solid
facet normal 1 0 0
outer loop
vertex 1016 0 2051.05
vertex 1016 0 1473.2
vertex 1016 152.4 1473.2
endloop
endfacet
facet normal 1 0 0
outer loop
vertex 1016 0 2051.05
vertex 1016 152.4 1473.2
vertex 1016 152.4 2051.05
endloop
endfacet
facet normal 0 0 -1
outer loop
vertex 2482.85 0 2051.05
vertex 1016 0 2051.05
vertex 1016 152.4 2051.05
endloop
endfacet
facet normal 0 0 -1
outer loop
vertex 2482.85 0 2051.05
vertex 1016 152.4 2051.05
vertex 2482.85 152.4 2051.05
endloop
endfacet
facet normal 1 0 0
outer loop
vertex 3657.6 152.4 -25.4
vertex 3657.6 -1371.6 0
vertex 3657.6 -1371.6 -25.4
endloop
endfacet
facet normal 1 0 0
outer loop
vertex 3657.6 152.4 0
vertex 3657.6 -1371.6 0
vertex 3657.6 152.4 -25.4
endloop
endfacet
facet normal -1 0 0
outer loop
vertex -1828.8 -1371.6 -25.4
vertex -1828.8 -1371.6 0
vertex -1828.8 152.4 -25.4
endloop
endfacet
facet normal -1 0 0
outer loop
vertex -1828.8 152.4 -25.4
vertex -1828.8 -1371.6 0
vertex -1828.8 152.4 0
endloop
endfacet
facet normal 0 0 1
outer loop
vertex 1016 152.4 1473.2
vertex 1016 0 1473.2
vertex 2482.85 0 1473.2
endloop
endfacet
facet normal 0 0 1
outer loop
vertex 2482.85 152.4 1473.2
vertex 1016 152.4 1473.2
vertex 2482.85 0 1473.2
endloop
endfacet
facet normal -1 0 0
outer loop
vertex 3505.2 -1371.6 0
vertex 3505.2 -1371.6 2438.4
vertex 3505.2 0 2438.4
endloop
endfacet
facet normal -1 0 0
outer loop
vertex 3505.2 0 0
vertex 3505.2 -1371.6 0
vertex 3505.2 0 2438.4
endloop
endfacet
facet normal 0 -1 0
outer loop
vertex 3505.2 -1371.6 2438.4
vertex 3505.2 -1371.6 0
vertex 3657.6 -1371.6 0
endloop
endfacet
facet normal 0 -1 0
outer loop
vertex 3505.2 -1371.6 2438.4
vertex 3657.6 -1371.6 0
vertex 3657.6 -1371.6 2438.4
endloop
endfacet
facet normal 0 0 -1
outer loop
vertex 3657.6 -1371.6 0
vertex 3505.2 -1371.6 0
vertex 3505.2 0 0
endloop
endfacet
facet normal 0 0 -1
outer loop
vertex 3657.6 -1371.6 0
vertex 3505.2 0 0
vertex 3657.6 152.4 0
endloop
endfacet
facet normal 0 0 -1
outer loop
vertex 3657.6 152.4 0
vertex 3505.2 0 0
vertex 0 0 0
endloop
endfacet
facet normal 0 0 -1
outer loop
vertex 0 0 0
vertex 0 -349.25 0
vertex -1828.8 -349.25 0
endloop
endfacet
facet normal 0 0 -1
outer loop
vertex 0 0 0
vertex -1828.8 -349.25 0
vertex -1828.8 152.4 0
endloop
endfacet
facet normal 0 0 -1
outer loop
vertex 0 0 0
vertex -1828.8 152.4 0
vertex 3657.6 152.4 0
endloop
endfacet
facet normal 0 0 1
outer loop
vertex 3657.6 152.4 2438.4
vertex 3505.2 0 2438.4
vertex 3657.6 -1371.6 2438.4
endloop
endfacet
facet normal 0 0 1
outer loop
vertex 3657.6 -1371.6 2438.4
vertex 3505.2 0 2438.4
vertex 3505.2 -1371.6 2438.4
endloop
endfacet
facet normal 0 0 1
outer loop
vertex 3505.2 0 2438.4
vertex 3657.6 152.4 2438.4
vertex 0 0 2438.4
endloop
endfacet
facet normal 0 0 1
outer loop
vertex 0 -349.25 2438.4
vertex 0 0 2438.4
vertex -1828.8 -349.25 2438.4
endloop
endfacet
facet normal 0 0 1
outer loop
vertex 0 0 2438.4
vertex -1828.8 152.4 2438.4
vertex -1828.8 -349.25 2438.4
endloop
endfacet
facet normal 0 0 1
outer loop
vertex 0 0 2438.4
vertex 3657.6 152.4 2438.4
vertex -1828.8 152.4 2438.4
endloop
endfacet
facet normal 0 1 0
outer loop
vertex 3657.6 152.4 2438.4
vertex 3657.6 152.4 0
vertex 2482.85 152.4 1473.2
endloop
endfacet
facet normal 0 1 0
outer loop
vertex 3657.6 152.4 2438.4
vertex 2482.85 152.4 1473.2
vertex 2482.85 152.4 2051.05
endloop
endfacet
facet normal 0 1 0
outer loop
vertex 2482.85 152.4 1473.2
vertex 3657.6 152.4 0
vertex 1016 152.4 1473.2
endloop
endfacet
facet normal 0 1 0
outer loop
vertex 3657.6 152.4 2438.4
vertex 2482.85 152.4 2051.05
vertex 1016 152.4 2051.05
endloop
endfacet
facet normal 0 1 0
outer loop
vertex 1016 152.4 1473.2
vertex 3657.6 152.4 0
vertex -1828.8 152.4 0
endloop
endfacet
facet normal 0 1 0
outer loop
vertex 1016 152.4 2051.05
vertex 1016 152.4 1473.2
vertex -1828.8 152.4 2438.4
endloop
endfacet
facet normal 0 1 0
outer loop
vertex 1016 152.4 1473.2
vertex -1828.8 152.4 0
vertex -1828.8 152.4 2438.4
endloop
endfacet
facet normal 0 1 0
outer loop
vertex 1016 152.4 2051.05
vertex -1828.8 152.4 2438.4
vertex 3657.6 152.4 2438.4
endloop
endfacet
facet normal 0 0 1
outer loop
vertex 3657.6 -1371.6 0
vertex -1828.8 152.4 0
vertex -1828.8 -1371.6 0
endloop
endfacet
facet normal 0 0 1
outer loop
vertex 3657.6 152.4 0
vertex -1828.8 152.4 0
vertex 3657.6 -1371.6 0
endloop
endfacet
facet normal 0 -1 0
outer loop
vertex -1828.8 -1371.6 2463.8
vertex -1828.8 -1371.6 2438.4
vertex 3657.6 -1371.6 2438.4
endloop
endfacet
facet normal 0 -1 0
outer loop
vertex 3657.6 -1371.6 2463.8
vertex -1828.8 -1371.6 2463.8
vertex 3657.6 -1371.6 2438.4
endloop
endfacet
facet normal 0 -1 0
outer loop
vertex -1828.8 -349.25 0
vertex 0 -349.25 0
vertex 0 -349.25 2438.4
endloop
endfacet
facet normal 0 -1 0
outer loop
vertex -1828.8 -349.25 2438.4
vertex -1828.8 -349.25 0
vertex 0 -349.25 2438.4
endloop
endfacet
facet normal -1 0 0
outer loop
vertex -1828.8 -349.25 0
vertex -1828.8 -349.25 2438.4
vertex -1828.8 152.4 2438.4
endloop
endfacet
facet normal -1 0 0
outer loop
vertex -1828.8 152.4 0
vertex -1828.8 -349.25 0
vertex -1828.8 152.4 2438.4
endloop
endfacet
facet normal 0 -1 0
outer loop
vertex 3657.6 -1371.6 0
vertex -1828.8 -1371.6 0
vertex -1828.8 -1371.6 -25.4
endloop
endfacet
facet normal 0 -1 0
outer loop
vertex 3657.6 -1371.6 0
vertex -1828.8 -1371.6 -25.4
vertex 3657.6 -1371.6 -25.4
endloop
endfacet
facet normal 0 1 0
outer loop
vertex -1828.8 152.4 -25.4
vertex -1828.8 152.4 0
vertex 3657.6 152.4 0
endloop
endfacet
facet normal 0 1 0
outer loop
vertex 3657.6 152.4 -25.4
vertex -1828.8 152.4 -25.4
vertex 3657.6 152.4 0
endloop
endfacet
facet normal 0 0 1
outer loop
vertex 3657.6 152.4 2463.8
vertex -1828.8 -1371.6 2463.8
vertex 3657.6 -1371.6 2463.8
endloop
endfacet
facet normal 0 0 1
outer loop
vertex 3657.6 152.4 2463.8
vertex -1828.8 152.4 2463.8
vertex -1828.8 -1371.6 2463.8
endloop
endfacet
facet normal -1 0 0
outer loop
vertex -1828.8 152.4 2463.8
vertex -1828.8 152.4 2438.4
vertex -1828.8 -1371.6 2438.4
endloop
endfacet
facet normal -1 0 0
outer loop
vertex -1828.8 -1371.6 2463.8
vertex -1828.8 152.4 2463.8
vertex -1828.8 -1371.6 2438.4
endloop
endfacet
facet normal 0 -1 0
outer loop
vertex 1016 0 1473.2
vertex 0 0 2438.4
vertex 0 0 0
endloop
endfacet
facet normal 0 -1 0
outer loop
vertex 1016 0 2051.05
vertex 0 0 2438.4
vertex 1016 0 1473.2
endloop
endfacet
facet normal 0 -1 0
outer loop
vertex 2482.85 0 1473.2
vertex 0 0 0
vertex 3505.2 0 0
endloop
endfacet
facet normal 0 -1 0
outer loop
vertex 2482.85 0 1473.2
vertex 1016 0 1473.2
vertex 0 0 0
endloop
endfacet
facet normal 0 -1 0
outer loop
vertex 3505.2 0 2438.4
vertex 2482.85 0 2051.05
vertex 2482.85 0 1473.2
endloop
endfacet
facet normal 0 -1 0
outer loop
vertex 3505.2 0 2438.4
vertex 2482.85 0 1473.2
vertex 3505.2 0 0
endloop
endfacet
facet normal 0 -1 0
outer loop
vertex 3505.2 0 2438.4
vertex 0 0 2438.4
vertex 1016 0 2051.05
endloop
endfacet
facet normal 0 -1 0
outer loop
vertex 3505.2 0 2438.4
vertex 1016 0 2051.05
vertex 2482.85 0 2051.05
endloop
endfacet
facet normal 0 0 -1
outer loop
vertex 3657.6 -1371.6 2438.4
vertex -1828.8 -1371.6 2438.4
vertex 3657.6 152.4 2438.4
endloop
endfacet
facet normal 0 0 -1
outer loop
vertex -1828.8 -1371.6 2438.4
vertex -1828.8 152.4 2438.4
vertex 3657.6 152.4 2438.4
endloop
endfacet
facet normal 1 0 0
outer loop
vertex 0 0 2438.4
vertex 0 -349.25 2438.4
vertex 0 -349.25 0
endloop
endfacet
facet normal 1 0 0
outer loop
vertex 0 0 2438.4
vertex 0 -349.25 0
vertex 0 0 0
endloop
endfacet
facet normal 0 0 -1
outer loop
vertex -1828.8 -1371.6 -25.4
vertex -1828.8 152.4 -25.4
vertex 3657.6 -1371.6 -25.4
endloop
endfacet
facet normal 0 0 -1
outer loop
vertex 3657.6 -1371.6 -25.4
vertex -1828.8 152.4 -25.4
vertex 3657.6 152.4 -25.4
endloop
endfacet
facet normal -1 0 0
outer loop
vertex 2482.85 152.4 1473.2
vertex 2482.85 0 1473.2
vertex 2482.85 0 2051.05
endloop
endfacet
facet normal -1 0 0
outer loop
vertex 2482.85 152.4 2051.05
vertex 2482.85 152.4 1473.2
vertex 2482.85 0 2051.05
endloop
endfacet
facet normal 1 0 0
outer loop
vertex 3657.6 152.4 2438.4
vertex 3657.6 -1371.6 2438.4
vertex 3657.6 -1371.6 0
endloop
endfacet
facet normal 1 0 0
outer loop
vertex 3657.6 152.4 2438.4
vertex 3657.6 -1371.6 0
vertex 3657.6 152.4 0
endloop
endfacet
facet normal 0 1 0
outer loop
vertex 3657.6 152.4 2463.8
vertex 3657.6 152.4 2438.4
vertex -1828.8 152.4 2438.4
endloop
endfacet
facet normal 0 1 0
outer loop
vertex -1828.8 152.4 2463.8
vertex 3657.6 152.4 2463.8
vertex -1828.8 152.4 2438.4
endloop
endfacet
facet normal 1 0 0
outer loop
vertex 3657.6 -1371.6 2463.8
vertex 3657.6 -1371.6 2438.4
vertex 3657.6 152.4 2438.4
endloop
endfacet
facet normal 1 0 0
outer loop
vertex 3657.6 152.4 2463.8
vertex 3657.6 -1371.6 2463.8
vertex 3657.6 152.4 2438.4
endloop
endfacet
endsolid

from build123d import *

# Parameters (mm, degrees)
F0_W      = 3505.2
F0_H      = 2438.4
F0_W_2    = 1466.85
F0_H_2    = 577.85
F1_DEPTH  = 152.4
F2_W      = 349.25
F2_H      = 2438.4
F1_FACE_W = 152.4
F1_FACE_H = 2438.4
F3_DEPTH  = 1828.8
F4_W      = 1371.6
F4_H      = 2438.4
F4_W_2    = 152.4
F5_DEPTH  = 152.4
F7_DEPTH  = 25.4
F8_W      = 5486.4
F8_H      = 1524
F9_DEPTH  = 25.4


with BuildPart() as f1:
    # F0 (on Front) → F1 (new body)
    with BuildSketch(Plane.XZ):
        with Locations((1752.6, 1219.2)):
            Rectangle(F0_W, F0_H)
        with Locations((1749.425, 1762.125)):
            Rectangle(F0_W_2, F0_H_2, mode=Mode.SUBTRACT)
    extrude(amount=-F1_DEPTH)

    # F2 (on Right) + F1_face (on face) → F3 (join)
    with BuildSketch(Plane.YZ):
        with Locations((-174.625, 1219.2)):
            Rectangle(F2_W, F2_H)
    with BuildSketch(Plane(origin=(0, 76.2, 1219.2), x_dir=(0, -1, 0), z_dir=(-1, 0, 0))):
        Rectangle(F1_FACE_W, F1_FACE_H)
    extrude(amount=-F3_DEPTH, dir=(1, 0, 0))

    # F4 (on face) → F5 (join)
    with BuildSketch(Plane.YZ.offset(3505.2)):
        with Locations((-685.8, 1219.2)):
            Rectangle(F4_W, F4_H)
        with Locations((76.2, 1219.2)):
            Rectangle(F4_W_2, F4_H)
    extrude(amount=F5_DEPTH)


with BuildPart() as f7:
    # F6 (on face) → F7 (new body)
    with BuildSketch(Plane.XY.offset(2438.4)):
        Polygon((-1828.8, -1371.6), (3505.2, -1371.6), (3505.2, 0), (0, 0), (0, -349.25), (-1828.8, -349.25), align=None)
        Polygon((3657.6, -1371.6), (3657.6, 152.4), (-1828.8, 152.4), (-1828.8, -349.25), (0, -349.25), (0, 0), (3505.2, 0), (3505.2, -1371.6), align=None)
    extrude(amount=F7_DEPTH)


with BuildPart() as f9:
    # F8 (on Top) → F9 (new body)
    with BuildSketch(Plane.XY):
        with Locations((914.4, -609.6)):
            Rectangle(F8_W, F8_H)
    extrude(amount=-F9_DEPTH)


solid = Compound([f1.part, f7.part, f9.part])
